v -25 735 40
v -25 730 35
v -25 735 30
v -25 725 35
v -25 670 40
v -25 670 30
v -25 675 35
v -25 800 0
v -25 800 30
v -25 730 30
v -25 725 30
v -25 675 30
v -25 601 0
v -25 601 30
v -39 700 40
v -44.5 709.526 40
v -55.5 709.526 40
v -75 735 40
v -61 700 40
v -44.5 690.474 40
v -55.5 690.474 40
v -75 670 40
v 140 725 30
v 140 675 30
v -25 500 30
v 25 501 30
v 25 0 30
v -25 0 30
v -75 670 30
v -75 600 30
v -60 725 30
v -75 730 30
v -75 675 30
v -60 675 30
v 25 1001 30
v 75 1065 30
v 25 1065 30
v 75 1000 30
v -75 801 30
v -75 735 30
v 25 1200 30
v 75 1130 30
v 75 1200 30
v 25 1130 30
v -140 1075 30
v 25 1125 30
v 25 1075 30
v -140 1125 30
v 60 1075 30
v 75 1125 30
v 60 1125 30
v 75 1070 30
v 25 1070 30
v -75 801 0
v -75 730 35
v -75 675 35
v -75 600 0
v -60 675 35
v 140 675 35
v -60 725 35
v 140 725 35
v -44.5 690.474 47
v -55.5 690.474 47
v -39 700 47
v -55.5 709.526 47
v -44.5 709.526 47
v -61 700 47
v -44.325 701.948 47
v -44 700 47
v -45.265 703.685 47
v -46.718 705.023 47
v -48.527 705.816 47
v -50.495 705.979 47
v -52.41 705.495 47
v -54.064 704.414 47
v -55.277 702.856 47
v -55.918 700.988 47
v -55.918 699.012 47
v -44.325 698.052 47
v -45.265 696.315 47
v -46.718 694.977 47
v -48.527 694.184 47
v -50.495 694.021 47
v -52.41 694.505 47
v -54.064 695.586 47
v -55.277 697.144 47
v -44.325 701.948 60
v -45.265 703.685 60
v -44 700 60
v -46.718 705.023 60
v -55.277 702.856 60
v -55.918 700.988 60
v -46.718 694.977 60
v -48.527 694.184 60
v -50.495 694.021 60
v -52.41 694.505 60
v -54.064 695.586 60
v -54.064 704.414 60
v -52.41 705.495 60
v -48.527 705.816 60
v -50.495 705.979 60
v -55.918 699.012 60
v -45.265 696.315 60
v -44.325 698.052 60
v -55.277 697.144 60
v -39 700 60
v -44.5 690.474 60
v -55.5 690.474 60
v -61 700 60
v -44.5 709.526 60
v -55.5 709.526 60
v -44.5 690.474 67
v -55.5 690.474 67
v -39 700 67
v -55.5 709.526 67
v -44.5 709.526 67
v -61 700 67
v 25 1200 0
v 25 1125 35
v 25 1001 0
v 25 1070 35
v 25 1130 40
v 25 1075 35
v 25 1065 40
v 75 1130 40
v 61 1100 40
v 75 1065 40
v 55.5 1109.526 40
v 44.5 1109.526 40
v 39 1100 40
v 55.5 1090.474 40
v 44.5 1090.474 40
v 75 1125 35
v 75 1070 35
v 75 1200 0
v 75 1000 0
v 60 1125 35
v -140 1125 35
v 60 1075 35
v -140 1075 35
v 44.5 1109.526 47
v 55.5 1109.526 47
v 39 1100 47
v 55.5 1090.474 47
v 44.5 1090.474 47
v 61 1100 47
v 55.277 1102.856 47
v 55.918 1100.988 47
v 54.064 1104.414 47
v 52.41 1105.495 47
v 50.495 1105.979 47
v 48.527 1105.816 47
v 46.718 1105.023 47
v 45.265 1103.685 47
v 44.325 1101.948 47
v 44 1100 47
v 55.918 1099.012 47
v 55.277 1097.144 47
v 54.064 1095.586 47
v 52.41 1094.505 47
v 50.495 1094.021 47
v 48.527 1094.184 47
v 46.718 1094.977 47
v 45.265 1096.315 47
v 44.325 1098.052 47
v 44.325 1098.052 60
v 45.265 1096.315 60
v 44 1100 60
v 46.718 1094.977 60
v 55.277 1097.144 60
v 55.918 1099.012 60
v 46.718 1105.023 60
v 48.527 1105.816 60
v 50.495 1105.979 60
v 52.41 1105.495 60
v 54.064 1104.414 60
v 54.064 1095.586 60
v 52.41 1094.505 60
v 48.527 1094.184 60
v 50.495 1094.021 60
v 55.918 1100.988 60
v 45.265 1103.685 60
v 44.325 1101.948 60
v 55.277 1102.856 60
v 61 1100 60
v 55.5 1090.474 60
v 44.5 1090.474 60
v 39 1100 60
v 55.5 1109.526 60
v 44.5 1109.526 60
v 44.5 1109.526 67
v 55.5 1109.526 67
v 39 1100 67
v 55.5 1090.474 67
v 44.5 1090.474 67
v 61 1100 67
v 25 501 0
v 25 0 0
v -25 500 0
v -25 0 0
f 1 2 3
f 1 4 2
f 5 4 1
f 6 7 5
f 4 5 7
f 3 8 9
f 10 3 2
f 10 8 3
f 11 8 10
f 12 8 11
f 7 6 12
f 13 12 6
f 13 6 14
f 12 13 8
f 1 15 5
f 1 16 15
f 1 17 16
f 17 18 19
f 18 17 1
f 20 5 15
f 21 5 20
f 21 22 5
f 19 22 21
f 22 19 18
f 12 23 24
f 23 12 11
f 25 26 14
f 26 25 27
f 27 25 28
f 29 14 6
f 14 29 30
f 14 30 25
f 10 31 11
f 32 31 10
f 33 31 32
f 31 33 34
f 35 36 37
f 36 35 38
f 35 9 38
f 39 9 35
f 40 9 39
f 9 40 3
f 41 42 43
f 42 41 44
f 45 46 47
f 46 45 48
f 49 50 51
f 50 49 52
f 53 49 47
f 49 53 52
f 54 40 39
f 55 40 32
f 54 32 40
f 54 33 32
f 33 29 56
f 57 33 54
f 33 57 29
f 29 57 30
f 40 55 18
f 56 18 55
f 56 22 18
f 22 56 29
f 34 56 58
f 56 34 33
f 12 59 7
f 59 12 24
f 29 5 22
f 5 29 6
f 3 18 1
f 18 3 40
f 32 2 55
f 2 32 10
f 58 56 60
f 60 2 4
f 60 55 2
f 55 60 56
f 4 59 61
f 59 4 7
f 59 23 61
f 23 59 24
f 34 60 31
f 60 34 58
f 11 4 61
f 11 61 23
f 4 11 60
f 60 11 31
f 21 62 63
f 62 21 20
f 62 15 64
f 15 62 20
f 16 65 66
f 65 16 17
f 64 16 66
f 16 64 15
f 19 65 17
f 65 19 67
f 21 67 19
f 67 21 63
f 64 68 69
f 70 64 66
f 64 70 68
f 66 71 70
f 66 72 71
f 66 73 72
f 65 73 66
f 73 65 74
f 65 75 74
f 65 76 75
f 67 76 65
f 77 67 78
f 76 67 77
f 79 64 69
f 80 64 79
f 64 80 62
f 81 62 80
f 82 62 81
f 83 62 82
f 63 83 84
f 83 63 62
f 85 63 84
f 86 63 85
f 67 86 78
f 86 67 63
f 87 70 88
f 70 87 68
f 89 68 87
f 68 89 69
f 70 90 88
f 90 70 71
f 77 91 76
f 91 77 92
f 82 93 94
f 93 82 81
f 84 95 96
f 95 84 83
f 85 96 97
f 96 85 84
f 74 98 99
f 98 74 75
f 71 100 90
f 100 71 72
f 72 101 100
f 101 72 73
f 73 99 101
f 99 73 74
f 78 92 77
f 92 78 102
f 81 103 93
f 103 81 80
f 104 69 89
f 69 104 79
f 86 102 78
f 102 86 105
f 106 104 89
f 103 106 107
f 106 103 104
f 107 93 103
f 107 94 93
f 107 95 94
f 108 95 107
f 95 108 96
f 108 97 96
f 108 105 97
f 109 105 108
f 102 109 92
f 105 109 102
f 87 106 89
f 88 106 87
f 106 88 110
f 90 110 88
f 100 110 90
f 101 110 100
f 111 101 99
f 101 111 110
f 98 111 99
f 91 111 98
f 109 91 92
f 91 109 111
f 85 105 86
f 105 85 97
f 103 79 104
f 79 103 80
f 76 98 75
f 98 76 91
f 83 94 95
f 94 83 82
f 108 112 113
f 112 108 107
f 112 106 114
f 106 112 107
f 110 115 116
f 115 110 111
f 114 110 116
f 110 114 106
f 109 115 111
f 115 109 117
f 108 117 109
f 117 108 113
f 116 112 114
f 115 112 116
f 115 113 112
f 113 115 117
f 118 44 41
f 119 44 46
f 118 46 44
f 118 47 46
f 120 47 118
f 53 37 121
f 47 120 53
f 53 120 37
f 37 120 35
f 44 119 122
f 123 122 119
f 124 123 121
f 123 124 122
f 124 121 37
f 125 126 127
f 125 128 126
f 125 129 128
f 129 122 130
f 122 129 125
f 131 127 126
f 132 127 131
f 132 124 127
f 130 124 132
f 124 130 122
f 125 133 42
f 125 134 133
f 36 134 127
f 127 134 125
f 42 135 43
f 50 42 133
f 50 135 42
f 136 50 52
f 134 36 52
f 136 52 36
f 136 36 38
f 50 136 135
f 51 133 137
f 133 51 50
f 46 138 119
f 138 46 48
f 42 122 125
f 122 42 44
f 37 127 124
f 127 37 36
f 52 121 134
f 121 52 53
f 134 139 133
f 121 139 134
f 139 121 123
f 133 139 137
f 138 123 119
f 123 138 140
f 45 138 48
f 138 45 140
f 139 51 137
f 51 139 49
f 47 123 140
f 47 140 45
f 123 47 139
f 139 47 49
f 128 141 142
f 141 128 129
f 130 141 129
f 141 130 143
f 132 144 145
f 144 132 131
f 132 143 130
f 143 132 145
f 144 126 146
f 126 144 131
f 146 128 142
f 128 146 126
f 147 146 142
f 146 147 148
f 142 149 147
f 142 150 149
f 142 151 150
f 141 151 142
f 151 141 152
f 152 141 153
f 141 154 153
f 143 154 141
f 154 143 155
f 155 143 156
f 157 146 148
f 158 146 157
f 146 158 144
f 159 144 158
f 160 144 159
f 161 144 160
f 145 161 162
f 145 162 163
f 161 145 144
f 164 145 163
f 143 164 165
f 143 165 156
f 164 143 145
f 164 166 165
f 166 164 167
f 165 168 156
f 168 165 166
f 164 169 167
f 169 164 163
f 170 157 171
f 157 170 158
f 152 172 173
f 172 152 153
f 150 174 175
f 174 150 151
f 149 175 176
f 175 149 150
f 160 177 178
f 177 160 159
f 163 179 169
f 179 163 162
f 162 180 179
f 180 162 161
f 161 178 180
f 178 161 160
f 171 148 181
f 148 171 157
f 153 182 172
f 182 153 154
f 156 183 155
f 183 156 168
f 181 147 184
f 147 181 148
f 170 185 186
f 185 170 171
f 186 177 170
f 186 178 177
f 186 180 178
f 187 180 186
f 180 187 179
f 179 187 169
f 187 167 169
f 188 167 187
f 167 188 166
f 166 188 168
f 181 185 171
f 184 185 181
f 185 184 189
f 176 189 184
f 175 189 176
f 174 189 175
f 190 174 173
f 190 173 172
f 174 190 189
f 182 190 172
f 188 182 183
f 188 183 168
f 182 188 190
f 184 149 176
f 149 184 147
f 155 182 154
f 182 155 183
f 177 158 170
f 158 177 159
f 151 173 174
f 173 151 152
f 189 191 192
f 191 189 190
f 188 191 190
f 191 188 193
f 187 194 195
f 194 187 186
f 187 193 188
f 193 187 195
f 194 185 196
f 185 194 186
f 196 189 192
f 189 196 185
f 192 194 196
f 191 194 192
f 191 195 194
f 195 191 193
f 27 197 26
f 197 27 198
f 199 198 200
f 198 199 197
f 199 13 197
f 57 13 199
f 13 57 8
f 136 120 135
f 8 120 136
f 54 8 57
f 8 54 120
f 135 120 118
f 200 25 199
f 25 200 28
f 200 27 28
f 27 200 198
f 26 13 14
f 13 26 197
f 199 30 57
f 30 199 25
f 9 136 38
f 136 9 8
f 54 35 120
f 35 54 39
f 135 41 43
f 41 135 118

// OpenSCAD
use <config.scad>

module tube(){
    translate([-25,0,0])cube([50, 1000, 30]); 
}

module support_tube(){
    translate([-25,-30,0])cube([50, 5, 10]);
    translate([-25,30,0])cube([50, 5, 10]); 
    translate([-25,-30,5])cube([50, 60, 5]); 
    color("green")translate([-10,-25,0])cube([200, 50, 5]);
    translate([0,0,10])cylinder(7, r = 11, $fn = 6);;
    translate([0,0,10])cylinder(20, r = 6);;
    translate([0,0,30])cylinder(7, r = 11, $fn = 6);;
    
}


module tube2(){
    translate([-25,0,0])cube([50, 500, 30]);
    hull(){
        translate([-25,500,0])cube([50, 1, 30]);
        translate([-50-25,600,0])cube([50, 1, 30]);
    }
    translate([-50,700,30]) support_tube();
    translate([-50-25,600,0])cube([50, 200, 30]);
    hull(){
        translate([-50-25,800,0])cube([50, 1, 30]);
        translate([50-25,1000,0])cube([50, 1, 30]);
    
    }
    translate([50,1100,30]) rotate([0,0,180]) support_tube();
    translate([50-25,1000,0])cube([50, 200, 30]);
}

module tube3(){
    translate([-25,0,0])cube([50, 550, 30]);
    translate([-50,700,30]) support_tube();
    translate([-50-25,500,0])cube([50, 450, 30]);
    
    translate([50,1100,30]) rotate([0,0,180]) support_tube();
    translate([-25,850,0])cube([50, 100, 30]);
    translate([50-25,850,0])cube([50, 300, 30]);
}

tube2();
